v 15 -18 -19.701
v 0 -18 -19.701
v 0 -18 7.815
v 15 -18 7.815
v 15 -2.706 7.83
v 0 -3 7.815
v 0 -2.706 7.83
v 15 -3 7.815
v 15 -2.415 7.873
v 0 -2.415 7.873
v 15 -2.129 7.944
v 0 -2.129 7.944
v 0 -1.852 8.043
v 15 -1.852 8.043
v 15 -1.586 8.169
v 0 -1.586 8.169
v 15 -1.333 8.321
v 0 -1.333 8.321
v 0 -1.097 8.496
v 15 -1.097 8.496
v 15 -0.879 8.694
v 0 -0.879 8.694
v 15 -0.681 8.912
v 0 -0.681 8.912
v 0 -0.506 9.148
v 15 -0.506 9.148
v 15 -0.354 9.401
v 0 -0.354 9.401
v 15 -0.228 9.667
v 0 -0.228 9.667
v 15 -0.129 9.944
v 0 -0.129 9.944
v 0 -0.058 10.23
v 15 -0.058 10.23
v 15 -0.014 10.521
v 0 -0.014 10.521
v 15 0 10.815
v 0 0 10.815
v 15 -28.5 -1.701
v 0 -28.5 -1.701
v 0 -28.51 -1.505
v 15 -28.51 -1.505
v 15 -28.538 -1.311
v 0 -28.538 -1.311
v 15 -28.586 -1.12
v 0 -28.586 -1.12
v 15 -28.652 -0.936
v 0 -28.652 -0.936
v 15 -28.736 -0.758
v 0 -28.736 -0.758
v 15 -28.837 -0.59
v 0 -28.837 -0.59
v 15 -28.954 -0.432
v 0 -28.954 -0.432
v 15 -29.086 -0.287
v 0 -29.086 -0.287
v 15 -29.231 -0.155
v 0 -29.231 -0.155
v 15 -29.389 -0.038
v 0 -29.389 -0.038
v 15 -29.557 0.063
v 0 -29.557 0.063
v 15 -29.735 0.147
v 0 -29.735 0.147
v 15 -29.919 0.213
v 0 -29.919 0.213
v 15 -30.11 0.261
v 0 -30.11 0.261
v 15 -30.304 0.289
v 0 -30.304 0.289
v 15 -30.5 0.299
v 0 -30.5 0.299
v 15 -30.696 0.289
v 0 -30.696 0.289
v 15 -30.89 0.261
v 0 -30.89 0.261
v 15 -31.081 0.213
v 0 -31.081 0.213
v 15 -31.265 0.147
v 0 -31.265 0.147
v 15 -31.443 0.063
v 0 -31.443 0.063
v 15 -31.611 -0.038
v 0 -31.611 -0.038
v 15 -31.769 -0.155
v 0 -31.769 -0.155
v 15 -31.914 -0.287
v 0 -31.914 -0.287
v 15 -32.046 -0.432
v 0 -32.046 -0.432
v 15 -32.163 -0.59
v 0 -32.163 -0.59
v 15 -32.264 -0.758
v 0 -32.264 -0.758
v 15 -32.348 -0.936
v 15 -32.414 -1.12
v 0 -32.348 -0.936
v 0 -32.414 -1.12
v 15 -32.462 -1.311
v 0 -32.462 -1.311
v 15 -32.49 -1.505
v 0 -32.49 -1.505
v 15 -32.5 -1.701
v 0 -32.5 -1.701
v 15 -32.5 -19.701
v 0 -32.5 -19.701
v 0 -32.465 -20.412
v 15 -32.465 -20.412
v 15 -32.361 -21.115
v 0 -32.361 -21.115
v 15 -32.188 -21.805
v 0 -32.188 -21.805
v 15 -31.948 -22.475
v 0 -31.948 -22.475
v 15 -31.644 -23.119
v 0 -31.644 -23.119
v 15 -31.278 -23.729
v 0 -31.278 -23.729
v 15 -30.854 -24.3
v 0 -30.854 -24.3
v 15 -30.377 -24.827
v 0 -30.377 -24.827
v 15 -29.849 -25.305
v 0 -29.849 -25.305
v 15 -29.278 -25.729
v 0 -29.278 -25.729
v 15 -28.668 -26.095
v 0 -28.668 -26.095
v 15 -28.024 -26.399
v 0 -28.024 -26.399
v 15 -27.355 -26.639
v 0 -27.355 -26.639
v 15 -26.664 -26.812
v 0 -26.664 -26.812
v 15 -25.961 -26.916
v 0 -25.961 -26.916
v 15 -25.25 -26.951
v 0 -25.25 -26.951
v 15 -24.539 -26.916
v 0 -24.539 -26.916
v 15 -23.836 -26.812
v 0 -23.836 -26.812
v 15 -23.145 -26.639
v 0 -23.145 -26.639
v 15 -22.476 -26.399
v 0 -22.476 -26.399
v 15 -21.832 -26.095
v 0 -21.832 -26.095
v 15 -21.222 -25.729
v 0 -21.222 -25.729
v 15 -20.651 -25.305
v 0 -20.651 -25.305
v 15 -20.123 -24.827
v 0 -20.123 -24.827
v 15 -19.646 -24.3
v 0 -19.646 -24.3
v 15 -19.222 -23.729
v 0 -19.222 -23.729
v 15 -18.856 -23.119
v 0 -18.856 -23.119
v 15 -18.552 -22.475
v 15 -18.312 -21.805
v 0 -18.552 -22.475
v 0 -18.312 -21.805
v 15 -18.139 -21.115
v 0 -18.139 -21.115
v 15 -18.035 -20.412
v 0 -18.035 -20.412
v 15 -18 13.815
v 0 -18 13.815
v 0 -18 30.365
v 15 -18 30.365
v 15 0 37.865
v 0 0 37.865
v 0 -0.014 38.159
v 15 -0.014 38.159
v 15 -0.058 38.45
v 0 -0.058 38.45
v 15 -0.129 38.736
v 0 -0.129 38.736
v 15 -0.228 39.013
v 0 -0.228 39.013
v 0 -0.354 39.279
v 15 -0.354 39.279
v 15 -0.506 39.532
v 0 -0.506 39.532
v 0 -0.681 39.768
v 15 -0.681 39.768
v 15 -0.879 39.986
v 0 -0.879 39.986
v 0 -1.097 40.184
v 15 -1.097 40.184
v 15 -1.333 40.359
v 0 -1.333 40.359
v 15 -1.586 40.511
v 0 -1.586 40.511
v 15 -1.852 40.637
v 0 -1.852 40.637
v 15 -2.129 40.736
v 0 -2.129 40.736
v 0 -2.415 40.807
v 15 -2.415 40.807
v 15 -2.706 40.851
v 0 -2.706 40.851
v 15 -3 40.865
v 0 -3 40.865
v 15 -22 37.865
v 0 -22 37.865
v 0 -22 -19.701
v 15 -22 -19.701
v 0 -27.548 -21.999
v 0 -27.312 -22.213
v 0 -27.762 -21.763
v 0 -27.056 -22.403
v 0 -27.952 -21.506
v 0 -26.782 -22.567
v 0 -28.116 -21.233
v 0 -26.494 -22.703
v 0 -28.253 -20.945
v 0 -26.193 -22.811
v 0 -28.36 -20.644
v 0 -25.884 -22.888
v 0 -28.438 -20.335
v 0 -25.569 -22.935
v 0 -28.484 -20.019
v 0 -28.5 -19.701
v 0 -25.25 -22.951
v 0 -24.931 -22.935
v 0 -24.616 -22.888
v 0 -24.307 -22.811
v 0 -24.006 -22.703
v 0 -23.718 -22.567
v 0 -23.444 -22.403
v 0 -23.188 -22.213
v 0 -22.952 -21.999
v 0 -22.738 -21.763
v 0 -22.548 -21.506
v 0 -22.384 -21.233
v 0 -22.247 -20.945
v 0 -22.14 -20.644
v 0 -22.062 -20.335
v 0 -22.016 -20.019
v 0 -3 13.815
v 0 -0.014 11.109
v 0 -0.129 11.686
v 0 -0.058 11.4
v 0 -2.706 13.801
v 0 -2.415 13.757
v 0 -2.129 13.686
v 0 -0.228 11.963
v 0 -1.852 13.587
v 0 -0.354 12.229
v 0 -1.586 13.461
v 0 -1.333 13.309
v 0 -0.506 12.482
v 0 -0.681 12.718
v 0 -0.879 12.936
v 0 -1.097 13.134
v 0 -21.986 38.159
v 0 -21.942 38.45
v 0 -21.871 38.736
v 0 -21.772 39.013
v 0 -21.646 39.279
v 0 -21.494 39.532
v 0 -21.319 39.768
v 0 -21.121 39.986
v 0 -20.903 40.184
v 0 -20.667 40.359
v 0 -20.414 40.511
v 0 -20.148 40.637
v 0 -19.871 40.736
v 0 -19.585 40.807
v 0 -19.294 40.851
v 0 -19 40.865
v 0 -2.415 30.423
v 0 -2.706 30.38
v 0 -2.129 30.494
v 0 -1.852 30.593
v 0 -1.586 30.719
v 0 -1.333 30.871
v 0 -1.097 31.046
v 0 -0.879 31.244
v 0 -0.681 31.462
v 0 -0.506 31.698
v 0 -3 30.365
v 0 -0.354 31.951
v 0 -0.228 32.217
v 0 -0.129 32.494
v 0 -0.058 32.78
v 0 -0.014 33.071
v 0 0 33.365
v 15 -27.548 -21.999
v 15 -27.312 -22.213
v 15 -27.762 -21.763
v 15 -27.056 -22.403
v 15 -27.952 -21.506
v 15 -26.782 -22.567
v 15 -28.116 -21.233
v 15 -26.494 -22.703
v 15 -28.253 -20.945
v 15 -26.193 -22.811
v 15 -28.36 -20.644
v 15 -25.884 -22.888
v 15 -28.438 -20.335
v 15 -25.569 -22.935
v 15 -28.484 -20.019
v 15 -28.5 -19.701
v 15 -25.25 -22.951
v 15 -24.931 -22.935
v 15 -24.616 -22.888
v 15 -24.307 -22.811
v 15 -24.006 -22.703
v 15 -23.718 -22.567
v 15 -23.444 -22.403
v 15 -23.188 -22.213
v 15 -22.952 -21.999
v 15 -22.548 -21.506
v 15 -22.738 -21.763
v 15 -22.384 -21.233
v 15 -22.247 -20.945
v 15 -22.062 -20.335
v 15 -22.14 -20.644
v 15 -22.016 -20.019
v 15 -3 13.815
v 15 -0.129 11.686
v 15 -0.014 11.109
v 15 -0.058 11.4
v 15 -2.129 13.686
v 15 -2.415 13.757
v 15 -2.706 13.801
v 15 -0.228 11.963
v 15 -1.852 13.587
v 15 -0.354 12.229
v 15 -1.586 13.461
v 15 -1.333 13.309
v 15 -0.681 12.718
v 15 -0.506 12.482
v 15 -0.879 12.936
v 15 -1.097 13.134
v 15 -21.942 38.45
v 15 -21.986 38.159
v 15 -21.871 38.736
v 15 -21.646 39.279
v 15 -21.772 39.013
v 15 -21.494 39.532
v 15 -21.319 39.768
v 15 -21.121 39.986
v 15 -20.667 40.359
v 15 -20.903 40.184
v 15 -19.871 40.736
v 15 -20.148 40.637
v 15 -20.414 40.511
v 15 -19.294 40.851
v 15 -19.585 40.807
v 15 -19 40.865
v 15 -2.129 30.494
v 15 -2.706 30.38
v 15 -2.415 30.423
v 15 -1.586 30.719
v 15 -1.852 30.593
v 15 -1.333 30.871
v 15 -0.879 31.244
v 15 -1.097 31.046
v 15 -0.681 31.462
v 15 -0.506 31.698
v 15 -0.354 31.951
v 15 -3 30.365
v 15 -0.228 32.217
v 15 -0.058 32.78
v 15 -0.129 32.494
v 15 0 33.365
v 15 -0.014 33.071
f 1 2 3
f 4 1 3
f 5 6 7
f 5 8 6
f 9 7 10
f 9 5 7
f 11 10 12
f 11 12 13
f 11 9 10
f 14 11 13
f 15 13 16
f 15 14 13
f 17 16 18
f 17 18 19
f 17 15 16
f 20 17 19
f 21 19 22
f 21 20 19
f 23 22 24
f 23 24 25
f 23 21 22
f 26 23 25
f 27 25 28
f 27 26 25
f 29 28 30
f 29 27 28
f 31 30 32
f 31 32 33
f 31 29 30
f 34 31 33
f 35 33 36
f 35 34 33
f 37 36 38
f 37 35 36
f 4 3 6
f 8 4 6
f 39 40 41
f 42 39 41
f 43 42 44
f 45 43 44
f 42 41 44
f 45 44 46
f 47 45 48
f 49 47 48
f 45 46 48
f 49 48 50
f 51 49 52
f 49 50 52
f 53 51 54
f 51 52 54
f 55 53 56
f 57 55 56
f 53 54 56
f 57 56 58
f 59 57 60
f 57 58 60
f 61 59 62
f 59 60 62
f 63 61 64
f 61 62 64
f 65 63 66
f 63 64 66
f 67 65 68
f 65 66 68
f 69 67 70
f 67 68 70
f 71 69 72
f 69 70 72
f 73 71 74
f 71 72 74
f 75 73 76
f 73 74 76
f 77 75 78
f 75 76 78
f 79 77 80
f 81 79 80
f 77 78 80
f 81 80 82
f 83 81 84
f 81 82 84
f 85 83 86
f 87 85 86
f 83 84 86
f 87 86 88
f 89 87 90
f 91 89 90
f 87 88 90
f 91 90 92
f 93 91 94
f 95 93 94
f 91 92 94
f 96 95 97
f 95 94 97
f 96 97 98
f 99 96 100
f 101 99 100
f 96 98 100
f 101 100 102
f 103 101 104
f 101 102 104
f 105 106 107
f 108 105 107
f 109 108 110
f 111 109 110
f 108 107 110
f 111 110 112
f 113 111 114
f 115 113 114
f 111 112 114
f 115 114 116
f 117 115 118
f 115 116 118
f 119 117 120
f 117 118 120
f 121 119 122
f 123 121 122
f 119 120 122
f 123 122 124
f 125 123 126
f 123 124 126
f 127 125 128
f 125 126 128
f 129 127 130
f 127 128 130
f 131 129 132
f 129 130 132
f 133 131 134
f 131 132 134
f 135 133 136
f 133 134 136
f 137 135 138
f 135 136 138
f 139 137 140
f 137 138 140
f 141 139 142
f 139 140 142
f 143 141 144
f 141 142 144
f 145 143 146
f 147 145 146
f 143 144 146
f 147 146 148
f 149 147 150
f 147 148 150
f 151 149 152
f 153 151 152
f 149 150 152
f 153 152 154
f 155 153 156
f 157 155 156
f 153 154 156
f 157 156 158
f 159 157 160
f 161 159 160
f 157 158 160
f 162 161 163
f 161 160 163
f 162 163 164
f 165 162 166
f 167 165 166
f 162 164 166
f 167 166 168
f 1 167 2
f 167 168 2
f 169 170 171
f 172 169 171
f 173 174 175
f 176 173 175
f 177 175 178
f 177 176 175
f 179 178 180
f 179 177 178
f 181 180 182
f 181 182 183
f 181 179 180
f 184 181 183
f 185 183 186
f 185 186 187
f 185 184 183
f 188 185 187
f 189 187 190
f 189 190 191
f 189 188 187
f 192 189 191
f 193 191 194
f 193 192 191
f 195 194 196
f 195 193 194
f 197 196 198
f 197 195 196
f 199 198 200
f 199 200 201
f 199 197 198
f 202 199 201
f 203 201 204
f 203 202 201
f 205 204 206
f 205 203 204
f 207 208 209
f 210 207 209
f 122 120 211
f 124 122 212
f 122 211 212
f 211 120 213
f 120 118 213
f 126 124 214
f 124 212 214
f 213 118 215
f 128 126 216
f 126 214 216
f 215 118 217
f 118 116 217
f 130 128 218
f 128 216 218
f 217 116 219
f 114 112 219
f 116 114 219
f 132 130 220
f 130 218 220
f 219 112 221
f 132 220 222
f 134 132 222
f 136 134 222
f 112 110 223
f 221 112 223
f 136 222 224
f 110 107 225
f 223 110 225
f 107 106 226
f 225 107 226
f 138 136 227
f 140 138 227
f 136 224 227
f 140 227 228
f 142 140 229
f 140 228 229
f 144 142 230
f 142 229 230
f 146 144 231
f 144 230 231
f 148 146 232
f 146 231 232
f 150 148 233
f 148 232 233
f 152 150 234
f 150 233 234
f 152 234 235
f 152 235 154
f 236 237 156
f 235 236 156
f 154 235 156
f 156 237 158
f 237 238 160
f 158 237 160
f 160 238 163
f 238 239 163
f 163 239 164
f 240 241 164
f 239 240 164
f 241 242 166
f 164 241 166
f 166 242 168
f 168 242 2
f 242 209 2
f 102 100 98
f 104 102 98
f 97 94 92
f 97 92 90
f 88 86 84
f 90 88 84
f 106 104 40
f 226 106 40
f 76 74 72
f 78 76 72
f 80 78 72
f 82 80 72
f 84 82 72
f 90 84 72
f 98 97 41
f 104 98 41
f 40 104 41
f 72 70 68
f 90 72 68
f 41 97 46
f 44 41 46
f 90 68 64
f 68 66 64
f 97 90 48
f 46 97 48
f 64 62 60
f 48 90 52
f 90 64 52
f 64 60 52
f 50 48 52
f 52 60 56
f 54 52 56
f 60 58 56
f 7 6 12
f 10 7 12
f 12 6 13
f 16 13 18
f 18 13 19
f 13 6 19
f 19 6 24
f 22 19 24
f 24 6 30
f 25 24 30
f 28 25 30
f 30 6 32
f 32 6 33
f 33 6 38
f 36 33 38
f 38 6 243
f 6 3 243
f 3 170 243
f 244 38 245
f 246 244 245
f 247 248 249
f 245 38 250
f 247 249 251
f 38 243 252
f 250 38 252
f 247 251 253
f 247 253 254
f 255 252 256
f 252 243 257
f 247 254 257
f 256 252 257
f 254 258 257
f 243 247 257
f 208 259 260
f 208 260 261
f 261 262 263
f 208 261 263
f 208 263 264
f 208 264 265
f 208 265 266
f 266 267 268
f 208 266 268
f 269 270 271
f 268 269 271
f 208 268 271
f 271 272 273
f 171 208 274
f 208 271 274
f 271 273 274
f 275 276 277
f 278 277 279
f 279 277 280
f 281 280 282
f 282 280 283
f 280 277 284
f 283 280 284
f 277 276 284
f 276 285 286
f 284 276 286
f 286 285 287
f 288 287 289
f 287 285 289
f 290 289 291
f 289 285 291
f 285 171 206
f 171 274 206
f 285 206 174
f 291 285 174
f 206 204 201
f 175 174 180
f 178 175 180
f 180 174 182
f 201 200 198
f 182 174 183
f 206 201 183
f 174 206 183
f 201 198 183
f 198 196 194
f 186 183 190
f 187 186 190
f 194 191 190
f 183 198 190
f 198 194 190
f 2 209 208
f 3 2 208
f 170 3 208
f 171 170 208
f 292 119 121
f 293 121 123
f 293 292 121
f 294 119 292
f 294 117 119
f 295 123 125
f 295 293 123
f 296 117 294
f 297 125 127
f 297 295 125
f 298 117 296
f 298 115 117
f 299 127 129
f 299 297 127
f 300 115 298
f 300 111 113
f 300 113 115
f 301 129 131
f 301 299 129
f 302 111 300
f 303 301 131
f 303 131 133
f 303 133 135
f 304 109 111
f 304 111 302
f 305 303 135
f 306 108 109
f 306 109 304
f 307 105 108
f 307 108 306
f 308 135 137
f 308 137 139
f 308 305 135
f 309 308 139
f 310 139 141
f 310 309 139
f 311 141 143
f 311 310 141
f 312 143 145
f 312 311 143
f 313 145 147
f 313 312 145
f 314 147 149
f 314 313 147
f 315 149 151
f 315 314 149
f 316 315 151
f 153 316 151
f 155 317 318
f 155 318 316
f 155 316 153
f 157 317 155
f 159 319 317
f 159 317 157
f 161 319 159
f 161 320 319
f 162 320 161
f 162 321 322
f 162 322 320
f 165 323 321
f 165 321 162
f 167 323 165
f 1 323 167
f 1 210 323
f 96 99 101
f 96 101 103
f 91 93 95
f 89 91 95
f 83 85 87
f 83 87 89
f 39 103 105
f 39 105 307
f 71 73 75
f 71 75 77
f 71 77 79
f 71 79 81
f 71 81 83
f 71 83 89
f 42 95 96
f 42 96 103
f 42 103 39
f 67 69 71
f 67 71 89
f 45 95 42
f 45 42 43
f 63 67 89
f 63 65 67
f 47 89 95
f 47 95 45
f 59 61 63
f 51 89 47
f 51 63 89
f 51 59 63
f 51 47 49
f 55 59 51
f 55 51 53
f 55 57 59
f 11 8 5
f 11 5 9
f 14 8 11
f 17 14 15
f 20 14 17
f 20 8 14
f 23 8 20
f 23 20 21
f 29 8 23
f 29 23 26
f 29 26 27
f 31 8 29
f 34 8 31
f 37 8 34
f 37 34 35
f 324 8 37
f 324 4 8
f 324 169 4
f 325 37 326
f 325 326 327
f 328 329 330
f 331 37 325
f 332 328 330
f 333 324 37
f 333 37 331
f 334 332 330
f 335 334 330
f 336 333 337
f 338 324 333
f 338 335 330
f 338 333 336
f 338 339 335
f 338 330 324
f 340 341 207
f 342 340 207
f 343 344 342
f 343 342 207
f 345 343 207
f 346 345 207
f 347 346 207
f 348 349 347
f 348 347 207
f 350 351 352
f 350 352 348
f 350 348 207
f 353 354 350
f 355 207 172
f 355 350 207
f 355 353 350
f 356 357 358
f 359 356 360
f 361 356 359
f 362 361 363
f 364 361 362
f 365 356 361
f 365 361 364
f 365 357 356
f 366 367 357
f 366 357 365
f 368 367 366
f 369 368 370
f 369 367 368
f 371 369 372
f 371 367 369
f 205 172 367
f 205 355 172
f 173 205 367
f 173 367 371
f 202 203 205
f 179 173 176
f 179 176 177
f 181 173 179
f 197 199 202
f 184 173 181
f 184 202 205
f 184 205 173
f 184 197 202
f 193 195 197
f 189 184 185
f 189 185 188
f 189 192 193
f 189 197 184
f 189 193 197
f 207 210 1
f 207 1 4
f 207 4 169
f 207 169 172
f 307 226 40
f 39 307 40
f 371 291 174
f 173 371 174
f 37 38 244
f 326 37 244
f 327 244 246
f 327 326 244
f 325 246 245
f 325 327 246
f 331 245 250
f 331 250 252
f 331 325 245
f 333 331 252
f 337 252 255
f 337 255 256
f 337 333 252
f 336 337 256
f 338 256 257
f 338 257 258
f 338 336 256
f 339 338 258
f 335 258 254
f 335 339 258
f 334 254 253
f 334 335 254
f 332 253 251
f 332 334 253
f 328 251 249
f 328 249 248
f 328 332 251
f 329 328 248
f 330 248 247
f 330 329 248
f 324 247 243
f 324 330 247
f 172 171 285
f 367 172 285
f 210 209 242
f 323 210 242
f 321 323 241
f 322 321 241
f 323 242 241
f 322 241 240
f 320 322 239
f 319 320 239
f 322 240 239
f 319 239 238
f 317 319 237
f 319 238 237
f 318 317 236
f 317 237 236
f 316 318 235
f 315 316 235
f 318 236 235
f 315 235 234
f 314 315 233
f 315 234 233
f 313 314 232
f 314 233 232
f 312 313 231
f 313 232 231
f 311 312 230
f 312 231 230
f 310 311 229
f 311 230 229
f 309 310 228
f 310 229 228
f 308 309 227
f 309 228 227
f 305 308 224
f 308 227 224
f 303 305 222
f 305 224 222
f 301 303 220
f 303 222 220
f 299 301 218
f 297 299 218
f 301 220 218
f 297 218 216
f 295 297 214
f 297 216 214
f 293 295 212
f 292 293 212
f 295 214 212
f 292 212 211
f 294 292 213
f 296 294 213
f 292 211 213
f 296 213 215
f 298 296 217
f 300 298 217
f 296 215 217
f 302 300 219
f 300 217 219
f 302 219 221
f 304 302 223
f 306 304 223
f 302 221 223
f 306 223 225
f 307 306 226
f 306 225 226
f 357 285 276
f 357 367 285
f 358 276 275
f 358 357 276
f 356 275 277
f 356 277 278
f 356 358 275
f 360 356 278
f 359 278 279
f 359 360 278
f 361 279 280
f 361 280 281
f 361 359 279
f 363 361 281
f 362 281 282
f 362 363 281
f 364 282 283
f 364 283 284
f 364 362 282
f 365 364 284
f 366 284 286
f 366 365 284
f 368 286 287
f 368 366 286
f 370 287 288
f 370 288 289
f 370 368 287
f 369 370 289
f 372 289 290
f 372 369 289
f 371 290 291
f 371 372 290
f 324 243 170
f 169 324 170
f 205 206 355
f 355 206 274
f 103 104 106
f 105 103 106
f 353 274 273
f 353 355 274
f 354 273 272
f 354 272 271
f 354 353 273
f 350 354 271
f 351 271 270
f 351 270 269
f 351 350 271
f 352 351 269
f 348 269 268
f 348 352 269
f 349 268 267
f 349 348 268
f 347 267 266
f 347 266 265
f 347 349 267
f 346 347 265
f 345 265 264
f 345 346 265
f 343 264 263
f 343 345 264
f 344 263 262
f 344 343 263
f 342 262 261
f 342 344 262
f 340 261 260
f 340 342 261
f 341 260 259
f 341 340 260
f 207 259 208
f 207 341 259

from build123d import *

# Parameters (mm, degrees)
F1_DEPTH = 15
F2_R     = 2.99999


# Not quite as in the source:
# - a fillet or chamfer is up to 0.001 mm smaller than in the source, because OpenCascade refuses the exact size


with BuildPart() as f1:
    # F0 (on Right) → F1 (new body)
    with BuildSketch(Plane.YZ):
        with BuildLine():
            Line((-18, 30.3650735612), (0, 30.3650735612))
            Line((0, 30.3650735612), (0, 40.8650735612))
            Line((0, 40.8650735612), (-22, 40.8650735612))
            Line((-22, 40.8650735612), (-22, -19.700880742))
            ThreePointArc((-22, -19.700880742), (-25.25, -22.950880742), (-28.5, -19.700880742))
            Line((-28.5, -19.700880742), (-28.5, -1.700880742))
            ThreePointArc((-28.5, -1.700880742), (-30.5, 0.299119258), (-32.5, -1.700880742))
            Line((-32.5, -1.700880742), (-32.5, -19.700880742))
            ThreePointArc((-32.5, -19.700880742), (-25.25, -26.950880742), (-18, -19.700880742))
            Line((-18, -19.700880742), (-18, 7.8150735612))
            Line((-18, 7.8150735612), (0, 7.8150735612))
            Line((0, 7.8150735612), (0, 13.8150735612))
            Line((0, 13.8150735612), (-18, 13.8150735612))
            Line((-18, 13.8150735612), (-18, 30.3650735612))
        make_face()
    extrude(amount=F1_DEPTH)

    # F2 (radius 3 in the source; OpenCascade refuses exactly that, so slightly less here)
    f2_edges = [f1.edges().sort_by_distance(p)[0] for p in [
        (7.5, 0, 30.365074),
        (7.5, 0, 13.815074),
        (7.5, 0, 40.865074),
        (7.5, 0, 7.815074),
        (7.5, -22, 40.865074),
    ]]
    fillet(f2_edges, radius=F2_R)


solid = f1.part
